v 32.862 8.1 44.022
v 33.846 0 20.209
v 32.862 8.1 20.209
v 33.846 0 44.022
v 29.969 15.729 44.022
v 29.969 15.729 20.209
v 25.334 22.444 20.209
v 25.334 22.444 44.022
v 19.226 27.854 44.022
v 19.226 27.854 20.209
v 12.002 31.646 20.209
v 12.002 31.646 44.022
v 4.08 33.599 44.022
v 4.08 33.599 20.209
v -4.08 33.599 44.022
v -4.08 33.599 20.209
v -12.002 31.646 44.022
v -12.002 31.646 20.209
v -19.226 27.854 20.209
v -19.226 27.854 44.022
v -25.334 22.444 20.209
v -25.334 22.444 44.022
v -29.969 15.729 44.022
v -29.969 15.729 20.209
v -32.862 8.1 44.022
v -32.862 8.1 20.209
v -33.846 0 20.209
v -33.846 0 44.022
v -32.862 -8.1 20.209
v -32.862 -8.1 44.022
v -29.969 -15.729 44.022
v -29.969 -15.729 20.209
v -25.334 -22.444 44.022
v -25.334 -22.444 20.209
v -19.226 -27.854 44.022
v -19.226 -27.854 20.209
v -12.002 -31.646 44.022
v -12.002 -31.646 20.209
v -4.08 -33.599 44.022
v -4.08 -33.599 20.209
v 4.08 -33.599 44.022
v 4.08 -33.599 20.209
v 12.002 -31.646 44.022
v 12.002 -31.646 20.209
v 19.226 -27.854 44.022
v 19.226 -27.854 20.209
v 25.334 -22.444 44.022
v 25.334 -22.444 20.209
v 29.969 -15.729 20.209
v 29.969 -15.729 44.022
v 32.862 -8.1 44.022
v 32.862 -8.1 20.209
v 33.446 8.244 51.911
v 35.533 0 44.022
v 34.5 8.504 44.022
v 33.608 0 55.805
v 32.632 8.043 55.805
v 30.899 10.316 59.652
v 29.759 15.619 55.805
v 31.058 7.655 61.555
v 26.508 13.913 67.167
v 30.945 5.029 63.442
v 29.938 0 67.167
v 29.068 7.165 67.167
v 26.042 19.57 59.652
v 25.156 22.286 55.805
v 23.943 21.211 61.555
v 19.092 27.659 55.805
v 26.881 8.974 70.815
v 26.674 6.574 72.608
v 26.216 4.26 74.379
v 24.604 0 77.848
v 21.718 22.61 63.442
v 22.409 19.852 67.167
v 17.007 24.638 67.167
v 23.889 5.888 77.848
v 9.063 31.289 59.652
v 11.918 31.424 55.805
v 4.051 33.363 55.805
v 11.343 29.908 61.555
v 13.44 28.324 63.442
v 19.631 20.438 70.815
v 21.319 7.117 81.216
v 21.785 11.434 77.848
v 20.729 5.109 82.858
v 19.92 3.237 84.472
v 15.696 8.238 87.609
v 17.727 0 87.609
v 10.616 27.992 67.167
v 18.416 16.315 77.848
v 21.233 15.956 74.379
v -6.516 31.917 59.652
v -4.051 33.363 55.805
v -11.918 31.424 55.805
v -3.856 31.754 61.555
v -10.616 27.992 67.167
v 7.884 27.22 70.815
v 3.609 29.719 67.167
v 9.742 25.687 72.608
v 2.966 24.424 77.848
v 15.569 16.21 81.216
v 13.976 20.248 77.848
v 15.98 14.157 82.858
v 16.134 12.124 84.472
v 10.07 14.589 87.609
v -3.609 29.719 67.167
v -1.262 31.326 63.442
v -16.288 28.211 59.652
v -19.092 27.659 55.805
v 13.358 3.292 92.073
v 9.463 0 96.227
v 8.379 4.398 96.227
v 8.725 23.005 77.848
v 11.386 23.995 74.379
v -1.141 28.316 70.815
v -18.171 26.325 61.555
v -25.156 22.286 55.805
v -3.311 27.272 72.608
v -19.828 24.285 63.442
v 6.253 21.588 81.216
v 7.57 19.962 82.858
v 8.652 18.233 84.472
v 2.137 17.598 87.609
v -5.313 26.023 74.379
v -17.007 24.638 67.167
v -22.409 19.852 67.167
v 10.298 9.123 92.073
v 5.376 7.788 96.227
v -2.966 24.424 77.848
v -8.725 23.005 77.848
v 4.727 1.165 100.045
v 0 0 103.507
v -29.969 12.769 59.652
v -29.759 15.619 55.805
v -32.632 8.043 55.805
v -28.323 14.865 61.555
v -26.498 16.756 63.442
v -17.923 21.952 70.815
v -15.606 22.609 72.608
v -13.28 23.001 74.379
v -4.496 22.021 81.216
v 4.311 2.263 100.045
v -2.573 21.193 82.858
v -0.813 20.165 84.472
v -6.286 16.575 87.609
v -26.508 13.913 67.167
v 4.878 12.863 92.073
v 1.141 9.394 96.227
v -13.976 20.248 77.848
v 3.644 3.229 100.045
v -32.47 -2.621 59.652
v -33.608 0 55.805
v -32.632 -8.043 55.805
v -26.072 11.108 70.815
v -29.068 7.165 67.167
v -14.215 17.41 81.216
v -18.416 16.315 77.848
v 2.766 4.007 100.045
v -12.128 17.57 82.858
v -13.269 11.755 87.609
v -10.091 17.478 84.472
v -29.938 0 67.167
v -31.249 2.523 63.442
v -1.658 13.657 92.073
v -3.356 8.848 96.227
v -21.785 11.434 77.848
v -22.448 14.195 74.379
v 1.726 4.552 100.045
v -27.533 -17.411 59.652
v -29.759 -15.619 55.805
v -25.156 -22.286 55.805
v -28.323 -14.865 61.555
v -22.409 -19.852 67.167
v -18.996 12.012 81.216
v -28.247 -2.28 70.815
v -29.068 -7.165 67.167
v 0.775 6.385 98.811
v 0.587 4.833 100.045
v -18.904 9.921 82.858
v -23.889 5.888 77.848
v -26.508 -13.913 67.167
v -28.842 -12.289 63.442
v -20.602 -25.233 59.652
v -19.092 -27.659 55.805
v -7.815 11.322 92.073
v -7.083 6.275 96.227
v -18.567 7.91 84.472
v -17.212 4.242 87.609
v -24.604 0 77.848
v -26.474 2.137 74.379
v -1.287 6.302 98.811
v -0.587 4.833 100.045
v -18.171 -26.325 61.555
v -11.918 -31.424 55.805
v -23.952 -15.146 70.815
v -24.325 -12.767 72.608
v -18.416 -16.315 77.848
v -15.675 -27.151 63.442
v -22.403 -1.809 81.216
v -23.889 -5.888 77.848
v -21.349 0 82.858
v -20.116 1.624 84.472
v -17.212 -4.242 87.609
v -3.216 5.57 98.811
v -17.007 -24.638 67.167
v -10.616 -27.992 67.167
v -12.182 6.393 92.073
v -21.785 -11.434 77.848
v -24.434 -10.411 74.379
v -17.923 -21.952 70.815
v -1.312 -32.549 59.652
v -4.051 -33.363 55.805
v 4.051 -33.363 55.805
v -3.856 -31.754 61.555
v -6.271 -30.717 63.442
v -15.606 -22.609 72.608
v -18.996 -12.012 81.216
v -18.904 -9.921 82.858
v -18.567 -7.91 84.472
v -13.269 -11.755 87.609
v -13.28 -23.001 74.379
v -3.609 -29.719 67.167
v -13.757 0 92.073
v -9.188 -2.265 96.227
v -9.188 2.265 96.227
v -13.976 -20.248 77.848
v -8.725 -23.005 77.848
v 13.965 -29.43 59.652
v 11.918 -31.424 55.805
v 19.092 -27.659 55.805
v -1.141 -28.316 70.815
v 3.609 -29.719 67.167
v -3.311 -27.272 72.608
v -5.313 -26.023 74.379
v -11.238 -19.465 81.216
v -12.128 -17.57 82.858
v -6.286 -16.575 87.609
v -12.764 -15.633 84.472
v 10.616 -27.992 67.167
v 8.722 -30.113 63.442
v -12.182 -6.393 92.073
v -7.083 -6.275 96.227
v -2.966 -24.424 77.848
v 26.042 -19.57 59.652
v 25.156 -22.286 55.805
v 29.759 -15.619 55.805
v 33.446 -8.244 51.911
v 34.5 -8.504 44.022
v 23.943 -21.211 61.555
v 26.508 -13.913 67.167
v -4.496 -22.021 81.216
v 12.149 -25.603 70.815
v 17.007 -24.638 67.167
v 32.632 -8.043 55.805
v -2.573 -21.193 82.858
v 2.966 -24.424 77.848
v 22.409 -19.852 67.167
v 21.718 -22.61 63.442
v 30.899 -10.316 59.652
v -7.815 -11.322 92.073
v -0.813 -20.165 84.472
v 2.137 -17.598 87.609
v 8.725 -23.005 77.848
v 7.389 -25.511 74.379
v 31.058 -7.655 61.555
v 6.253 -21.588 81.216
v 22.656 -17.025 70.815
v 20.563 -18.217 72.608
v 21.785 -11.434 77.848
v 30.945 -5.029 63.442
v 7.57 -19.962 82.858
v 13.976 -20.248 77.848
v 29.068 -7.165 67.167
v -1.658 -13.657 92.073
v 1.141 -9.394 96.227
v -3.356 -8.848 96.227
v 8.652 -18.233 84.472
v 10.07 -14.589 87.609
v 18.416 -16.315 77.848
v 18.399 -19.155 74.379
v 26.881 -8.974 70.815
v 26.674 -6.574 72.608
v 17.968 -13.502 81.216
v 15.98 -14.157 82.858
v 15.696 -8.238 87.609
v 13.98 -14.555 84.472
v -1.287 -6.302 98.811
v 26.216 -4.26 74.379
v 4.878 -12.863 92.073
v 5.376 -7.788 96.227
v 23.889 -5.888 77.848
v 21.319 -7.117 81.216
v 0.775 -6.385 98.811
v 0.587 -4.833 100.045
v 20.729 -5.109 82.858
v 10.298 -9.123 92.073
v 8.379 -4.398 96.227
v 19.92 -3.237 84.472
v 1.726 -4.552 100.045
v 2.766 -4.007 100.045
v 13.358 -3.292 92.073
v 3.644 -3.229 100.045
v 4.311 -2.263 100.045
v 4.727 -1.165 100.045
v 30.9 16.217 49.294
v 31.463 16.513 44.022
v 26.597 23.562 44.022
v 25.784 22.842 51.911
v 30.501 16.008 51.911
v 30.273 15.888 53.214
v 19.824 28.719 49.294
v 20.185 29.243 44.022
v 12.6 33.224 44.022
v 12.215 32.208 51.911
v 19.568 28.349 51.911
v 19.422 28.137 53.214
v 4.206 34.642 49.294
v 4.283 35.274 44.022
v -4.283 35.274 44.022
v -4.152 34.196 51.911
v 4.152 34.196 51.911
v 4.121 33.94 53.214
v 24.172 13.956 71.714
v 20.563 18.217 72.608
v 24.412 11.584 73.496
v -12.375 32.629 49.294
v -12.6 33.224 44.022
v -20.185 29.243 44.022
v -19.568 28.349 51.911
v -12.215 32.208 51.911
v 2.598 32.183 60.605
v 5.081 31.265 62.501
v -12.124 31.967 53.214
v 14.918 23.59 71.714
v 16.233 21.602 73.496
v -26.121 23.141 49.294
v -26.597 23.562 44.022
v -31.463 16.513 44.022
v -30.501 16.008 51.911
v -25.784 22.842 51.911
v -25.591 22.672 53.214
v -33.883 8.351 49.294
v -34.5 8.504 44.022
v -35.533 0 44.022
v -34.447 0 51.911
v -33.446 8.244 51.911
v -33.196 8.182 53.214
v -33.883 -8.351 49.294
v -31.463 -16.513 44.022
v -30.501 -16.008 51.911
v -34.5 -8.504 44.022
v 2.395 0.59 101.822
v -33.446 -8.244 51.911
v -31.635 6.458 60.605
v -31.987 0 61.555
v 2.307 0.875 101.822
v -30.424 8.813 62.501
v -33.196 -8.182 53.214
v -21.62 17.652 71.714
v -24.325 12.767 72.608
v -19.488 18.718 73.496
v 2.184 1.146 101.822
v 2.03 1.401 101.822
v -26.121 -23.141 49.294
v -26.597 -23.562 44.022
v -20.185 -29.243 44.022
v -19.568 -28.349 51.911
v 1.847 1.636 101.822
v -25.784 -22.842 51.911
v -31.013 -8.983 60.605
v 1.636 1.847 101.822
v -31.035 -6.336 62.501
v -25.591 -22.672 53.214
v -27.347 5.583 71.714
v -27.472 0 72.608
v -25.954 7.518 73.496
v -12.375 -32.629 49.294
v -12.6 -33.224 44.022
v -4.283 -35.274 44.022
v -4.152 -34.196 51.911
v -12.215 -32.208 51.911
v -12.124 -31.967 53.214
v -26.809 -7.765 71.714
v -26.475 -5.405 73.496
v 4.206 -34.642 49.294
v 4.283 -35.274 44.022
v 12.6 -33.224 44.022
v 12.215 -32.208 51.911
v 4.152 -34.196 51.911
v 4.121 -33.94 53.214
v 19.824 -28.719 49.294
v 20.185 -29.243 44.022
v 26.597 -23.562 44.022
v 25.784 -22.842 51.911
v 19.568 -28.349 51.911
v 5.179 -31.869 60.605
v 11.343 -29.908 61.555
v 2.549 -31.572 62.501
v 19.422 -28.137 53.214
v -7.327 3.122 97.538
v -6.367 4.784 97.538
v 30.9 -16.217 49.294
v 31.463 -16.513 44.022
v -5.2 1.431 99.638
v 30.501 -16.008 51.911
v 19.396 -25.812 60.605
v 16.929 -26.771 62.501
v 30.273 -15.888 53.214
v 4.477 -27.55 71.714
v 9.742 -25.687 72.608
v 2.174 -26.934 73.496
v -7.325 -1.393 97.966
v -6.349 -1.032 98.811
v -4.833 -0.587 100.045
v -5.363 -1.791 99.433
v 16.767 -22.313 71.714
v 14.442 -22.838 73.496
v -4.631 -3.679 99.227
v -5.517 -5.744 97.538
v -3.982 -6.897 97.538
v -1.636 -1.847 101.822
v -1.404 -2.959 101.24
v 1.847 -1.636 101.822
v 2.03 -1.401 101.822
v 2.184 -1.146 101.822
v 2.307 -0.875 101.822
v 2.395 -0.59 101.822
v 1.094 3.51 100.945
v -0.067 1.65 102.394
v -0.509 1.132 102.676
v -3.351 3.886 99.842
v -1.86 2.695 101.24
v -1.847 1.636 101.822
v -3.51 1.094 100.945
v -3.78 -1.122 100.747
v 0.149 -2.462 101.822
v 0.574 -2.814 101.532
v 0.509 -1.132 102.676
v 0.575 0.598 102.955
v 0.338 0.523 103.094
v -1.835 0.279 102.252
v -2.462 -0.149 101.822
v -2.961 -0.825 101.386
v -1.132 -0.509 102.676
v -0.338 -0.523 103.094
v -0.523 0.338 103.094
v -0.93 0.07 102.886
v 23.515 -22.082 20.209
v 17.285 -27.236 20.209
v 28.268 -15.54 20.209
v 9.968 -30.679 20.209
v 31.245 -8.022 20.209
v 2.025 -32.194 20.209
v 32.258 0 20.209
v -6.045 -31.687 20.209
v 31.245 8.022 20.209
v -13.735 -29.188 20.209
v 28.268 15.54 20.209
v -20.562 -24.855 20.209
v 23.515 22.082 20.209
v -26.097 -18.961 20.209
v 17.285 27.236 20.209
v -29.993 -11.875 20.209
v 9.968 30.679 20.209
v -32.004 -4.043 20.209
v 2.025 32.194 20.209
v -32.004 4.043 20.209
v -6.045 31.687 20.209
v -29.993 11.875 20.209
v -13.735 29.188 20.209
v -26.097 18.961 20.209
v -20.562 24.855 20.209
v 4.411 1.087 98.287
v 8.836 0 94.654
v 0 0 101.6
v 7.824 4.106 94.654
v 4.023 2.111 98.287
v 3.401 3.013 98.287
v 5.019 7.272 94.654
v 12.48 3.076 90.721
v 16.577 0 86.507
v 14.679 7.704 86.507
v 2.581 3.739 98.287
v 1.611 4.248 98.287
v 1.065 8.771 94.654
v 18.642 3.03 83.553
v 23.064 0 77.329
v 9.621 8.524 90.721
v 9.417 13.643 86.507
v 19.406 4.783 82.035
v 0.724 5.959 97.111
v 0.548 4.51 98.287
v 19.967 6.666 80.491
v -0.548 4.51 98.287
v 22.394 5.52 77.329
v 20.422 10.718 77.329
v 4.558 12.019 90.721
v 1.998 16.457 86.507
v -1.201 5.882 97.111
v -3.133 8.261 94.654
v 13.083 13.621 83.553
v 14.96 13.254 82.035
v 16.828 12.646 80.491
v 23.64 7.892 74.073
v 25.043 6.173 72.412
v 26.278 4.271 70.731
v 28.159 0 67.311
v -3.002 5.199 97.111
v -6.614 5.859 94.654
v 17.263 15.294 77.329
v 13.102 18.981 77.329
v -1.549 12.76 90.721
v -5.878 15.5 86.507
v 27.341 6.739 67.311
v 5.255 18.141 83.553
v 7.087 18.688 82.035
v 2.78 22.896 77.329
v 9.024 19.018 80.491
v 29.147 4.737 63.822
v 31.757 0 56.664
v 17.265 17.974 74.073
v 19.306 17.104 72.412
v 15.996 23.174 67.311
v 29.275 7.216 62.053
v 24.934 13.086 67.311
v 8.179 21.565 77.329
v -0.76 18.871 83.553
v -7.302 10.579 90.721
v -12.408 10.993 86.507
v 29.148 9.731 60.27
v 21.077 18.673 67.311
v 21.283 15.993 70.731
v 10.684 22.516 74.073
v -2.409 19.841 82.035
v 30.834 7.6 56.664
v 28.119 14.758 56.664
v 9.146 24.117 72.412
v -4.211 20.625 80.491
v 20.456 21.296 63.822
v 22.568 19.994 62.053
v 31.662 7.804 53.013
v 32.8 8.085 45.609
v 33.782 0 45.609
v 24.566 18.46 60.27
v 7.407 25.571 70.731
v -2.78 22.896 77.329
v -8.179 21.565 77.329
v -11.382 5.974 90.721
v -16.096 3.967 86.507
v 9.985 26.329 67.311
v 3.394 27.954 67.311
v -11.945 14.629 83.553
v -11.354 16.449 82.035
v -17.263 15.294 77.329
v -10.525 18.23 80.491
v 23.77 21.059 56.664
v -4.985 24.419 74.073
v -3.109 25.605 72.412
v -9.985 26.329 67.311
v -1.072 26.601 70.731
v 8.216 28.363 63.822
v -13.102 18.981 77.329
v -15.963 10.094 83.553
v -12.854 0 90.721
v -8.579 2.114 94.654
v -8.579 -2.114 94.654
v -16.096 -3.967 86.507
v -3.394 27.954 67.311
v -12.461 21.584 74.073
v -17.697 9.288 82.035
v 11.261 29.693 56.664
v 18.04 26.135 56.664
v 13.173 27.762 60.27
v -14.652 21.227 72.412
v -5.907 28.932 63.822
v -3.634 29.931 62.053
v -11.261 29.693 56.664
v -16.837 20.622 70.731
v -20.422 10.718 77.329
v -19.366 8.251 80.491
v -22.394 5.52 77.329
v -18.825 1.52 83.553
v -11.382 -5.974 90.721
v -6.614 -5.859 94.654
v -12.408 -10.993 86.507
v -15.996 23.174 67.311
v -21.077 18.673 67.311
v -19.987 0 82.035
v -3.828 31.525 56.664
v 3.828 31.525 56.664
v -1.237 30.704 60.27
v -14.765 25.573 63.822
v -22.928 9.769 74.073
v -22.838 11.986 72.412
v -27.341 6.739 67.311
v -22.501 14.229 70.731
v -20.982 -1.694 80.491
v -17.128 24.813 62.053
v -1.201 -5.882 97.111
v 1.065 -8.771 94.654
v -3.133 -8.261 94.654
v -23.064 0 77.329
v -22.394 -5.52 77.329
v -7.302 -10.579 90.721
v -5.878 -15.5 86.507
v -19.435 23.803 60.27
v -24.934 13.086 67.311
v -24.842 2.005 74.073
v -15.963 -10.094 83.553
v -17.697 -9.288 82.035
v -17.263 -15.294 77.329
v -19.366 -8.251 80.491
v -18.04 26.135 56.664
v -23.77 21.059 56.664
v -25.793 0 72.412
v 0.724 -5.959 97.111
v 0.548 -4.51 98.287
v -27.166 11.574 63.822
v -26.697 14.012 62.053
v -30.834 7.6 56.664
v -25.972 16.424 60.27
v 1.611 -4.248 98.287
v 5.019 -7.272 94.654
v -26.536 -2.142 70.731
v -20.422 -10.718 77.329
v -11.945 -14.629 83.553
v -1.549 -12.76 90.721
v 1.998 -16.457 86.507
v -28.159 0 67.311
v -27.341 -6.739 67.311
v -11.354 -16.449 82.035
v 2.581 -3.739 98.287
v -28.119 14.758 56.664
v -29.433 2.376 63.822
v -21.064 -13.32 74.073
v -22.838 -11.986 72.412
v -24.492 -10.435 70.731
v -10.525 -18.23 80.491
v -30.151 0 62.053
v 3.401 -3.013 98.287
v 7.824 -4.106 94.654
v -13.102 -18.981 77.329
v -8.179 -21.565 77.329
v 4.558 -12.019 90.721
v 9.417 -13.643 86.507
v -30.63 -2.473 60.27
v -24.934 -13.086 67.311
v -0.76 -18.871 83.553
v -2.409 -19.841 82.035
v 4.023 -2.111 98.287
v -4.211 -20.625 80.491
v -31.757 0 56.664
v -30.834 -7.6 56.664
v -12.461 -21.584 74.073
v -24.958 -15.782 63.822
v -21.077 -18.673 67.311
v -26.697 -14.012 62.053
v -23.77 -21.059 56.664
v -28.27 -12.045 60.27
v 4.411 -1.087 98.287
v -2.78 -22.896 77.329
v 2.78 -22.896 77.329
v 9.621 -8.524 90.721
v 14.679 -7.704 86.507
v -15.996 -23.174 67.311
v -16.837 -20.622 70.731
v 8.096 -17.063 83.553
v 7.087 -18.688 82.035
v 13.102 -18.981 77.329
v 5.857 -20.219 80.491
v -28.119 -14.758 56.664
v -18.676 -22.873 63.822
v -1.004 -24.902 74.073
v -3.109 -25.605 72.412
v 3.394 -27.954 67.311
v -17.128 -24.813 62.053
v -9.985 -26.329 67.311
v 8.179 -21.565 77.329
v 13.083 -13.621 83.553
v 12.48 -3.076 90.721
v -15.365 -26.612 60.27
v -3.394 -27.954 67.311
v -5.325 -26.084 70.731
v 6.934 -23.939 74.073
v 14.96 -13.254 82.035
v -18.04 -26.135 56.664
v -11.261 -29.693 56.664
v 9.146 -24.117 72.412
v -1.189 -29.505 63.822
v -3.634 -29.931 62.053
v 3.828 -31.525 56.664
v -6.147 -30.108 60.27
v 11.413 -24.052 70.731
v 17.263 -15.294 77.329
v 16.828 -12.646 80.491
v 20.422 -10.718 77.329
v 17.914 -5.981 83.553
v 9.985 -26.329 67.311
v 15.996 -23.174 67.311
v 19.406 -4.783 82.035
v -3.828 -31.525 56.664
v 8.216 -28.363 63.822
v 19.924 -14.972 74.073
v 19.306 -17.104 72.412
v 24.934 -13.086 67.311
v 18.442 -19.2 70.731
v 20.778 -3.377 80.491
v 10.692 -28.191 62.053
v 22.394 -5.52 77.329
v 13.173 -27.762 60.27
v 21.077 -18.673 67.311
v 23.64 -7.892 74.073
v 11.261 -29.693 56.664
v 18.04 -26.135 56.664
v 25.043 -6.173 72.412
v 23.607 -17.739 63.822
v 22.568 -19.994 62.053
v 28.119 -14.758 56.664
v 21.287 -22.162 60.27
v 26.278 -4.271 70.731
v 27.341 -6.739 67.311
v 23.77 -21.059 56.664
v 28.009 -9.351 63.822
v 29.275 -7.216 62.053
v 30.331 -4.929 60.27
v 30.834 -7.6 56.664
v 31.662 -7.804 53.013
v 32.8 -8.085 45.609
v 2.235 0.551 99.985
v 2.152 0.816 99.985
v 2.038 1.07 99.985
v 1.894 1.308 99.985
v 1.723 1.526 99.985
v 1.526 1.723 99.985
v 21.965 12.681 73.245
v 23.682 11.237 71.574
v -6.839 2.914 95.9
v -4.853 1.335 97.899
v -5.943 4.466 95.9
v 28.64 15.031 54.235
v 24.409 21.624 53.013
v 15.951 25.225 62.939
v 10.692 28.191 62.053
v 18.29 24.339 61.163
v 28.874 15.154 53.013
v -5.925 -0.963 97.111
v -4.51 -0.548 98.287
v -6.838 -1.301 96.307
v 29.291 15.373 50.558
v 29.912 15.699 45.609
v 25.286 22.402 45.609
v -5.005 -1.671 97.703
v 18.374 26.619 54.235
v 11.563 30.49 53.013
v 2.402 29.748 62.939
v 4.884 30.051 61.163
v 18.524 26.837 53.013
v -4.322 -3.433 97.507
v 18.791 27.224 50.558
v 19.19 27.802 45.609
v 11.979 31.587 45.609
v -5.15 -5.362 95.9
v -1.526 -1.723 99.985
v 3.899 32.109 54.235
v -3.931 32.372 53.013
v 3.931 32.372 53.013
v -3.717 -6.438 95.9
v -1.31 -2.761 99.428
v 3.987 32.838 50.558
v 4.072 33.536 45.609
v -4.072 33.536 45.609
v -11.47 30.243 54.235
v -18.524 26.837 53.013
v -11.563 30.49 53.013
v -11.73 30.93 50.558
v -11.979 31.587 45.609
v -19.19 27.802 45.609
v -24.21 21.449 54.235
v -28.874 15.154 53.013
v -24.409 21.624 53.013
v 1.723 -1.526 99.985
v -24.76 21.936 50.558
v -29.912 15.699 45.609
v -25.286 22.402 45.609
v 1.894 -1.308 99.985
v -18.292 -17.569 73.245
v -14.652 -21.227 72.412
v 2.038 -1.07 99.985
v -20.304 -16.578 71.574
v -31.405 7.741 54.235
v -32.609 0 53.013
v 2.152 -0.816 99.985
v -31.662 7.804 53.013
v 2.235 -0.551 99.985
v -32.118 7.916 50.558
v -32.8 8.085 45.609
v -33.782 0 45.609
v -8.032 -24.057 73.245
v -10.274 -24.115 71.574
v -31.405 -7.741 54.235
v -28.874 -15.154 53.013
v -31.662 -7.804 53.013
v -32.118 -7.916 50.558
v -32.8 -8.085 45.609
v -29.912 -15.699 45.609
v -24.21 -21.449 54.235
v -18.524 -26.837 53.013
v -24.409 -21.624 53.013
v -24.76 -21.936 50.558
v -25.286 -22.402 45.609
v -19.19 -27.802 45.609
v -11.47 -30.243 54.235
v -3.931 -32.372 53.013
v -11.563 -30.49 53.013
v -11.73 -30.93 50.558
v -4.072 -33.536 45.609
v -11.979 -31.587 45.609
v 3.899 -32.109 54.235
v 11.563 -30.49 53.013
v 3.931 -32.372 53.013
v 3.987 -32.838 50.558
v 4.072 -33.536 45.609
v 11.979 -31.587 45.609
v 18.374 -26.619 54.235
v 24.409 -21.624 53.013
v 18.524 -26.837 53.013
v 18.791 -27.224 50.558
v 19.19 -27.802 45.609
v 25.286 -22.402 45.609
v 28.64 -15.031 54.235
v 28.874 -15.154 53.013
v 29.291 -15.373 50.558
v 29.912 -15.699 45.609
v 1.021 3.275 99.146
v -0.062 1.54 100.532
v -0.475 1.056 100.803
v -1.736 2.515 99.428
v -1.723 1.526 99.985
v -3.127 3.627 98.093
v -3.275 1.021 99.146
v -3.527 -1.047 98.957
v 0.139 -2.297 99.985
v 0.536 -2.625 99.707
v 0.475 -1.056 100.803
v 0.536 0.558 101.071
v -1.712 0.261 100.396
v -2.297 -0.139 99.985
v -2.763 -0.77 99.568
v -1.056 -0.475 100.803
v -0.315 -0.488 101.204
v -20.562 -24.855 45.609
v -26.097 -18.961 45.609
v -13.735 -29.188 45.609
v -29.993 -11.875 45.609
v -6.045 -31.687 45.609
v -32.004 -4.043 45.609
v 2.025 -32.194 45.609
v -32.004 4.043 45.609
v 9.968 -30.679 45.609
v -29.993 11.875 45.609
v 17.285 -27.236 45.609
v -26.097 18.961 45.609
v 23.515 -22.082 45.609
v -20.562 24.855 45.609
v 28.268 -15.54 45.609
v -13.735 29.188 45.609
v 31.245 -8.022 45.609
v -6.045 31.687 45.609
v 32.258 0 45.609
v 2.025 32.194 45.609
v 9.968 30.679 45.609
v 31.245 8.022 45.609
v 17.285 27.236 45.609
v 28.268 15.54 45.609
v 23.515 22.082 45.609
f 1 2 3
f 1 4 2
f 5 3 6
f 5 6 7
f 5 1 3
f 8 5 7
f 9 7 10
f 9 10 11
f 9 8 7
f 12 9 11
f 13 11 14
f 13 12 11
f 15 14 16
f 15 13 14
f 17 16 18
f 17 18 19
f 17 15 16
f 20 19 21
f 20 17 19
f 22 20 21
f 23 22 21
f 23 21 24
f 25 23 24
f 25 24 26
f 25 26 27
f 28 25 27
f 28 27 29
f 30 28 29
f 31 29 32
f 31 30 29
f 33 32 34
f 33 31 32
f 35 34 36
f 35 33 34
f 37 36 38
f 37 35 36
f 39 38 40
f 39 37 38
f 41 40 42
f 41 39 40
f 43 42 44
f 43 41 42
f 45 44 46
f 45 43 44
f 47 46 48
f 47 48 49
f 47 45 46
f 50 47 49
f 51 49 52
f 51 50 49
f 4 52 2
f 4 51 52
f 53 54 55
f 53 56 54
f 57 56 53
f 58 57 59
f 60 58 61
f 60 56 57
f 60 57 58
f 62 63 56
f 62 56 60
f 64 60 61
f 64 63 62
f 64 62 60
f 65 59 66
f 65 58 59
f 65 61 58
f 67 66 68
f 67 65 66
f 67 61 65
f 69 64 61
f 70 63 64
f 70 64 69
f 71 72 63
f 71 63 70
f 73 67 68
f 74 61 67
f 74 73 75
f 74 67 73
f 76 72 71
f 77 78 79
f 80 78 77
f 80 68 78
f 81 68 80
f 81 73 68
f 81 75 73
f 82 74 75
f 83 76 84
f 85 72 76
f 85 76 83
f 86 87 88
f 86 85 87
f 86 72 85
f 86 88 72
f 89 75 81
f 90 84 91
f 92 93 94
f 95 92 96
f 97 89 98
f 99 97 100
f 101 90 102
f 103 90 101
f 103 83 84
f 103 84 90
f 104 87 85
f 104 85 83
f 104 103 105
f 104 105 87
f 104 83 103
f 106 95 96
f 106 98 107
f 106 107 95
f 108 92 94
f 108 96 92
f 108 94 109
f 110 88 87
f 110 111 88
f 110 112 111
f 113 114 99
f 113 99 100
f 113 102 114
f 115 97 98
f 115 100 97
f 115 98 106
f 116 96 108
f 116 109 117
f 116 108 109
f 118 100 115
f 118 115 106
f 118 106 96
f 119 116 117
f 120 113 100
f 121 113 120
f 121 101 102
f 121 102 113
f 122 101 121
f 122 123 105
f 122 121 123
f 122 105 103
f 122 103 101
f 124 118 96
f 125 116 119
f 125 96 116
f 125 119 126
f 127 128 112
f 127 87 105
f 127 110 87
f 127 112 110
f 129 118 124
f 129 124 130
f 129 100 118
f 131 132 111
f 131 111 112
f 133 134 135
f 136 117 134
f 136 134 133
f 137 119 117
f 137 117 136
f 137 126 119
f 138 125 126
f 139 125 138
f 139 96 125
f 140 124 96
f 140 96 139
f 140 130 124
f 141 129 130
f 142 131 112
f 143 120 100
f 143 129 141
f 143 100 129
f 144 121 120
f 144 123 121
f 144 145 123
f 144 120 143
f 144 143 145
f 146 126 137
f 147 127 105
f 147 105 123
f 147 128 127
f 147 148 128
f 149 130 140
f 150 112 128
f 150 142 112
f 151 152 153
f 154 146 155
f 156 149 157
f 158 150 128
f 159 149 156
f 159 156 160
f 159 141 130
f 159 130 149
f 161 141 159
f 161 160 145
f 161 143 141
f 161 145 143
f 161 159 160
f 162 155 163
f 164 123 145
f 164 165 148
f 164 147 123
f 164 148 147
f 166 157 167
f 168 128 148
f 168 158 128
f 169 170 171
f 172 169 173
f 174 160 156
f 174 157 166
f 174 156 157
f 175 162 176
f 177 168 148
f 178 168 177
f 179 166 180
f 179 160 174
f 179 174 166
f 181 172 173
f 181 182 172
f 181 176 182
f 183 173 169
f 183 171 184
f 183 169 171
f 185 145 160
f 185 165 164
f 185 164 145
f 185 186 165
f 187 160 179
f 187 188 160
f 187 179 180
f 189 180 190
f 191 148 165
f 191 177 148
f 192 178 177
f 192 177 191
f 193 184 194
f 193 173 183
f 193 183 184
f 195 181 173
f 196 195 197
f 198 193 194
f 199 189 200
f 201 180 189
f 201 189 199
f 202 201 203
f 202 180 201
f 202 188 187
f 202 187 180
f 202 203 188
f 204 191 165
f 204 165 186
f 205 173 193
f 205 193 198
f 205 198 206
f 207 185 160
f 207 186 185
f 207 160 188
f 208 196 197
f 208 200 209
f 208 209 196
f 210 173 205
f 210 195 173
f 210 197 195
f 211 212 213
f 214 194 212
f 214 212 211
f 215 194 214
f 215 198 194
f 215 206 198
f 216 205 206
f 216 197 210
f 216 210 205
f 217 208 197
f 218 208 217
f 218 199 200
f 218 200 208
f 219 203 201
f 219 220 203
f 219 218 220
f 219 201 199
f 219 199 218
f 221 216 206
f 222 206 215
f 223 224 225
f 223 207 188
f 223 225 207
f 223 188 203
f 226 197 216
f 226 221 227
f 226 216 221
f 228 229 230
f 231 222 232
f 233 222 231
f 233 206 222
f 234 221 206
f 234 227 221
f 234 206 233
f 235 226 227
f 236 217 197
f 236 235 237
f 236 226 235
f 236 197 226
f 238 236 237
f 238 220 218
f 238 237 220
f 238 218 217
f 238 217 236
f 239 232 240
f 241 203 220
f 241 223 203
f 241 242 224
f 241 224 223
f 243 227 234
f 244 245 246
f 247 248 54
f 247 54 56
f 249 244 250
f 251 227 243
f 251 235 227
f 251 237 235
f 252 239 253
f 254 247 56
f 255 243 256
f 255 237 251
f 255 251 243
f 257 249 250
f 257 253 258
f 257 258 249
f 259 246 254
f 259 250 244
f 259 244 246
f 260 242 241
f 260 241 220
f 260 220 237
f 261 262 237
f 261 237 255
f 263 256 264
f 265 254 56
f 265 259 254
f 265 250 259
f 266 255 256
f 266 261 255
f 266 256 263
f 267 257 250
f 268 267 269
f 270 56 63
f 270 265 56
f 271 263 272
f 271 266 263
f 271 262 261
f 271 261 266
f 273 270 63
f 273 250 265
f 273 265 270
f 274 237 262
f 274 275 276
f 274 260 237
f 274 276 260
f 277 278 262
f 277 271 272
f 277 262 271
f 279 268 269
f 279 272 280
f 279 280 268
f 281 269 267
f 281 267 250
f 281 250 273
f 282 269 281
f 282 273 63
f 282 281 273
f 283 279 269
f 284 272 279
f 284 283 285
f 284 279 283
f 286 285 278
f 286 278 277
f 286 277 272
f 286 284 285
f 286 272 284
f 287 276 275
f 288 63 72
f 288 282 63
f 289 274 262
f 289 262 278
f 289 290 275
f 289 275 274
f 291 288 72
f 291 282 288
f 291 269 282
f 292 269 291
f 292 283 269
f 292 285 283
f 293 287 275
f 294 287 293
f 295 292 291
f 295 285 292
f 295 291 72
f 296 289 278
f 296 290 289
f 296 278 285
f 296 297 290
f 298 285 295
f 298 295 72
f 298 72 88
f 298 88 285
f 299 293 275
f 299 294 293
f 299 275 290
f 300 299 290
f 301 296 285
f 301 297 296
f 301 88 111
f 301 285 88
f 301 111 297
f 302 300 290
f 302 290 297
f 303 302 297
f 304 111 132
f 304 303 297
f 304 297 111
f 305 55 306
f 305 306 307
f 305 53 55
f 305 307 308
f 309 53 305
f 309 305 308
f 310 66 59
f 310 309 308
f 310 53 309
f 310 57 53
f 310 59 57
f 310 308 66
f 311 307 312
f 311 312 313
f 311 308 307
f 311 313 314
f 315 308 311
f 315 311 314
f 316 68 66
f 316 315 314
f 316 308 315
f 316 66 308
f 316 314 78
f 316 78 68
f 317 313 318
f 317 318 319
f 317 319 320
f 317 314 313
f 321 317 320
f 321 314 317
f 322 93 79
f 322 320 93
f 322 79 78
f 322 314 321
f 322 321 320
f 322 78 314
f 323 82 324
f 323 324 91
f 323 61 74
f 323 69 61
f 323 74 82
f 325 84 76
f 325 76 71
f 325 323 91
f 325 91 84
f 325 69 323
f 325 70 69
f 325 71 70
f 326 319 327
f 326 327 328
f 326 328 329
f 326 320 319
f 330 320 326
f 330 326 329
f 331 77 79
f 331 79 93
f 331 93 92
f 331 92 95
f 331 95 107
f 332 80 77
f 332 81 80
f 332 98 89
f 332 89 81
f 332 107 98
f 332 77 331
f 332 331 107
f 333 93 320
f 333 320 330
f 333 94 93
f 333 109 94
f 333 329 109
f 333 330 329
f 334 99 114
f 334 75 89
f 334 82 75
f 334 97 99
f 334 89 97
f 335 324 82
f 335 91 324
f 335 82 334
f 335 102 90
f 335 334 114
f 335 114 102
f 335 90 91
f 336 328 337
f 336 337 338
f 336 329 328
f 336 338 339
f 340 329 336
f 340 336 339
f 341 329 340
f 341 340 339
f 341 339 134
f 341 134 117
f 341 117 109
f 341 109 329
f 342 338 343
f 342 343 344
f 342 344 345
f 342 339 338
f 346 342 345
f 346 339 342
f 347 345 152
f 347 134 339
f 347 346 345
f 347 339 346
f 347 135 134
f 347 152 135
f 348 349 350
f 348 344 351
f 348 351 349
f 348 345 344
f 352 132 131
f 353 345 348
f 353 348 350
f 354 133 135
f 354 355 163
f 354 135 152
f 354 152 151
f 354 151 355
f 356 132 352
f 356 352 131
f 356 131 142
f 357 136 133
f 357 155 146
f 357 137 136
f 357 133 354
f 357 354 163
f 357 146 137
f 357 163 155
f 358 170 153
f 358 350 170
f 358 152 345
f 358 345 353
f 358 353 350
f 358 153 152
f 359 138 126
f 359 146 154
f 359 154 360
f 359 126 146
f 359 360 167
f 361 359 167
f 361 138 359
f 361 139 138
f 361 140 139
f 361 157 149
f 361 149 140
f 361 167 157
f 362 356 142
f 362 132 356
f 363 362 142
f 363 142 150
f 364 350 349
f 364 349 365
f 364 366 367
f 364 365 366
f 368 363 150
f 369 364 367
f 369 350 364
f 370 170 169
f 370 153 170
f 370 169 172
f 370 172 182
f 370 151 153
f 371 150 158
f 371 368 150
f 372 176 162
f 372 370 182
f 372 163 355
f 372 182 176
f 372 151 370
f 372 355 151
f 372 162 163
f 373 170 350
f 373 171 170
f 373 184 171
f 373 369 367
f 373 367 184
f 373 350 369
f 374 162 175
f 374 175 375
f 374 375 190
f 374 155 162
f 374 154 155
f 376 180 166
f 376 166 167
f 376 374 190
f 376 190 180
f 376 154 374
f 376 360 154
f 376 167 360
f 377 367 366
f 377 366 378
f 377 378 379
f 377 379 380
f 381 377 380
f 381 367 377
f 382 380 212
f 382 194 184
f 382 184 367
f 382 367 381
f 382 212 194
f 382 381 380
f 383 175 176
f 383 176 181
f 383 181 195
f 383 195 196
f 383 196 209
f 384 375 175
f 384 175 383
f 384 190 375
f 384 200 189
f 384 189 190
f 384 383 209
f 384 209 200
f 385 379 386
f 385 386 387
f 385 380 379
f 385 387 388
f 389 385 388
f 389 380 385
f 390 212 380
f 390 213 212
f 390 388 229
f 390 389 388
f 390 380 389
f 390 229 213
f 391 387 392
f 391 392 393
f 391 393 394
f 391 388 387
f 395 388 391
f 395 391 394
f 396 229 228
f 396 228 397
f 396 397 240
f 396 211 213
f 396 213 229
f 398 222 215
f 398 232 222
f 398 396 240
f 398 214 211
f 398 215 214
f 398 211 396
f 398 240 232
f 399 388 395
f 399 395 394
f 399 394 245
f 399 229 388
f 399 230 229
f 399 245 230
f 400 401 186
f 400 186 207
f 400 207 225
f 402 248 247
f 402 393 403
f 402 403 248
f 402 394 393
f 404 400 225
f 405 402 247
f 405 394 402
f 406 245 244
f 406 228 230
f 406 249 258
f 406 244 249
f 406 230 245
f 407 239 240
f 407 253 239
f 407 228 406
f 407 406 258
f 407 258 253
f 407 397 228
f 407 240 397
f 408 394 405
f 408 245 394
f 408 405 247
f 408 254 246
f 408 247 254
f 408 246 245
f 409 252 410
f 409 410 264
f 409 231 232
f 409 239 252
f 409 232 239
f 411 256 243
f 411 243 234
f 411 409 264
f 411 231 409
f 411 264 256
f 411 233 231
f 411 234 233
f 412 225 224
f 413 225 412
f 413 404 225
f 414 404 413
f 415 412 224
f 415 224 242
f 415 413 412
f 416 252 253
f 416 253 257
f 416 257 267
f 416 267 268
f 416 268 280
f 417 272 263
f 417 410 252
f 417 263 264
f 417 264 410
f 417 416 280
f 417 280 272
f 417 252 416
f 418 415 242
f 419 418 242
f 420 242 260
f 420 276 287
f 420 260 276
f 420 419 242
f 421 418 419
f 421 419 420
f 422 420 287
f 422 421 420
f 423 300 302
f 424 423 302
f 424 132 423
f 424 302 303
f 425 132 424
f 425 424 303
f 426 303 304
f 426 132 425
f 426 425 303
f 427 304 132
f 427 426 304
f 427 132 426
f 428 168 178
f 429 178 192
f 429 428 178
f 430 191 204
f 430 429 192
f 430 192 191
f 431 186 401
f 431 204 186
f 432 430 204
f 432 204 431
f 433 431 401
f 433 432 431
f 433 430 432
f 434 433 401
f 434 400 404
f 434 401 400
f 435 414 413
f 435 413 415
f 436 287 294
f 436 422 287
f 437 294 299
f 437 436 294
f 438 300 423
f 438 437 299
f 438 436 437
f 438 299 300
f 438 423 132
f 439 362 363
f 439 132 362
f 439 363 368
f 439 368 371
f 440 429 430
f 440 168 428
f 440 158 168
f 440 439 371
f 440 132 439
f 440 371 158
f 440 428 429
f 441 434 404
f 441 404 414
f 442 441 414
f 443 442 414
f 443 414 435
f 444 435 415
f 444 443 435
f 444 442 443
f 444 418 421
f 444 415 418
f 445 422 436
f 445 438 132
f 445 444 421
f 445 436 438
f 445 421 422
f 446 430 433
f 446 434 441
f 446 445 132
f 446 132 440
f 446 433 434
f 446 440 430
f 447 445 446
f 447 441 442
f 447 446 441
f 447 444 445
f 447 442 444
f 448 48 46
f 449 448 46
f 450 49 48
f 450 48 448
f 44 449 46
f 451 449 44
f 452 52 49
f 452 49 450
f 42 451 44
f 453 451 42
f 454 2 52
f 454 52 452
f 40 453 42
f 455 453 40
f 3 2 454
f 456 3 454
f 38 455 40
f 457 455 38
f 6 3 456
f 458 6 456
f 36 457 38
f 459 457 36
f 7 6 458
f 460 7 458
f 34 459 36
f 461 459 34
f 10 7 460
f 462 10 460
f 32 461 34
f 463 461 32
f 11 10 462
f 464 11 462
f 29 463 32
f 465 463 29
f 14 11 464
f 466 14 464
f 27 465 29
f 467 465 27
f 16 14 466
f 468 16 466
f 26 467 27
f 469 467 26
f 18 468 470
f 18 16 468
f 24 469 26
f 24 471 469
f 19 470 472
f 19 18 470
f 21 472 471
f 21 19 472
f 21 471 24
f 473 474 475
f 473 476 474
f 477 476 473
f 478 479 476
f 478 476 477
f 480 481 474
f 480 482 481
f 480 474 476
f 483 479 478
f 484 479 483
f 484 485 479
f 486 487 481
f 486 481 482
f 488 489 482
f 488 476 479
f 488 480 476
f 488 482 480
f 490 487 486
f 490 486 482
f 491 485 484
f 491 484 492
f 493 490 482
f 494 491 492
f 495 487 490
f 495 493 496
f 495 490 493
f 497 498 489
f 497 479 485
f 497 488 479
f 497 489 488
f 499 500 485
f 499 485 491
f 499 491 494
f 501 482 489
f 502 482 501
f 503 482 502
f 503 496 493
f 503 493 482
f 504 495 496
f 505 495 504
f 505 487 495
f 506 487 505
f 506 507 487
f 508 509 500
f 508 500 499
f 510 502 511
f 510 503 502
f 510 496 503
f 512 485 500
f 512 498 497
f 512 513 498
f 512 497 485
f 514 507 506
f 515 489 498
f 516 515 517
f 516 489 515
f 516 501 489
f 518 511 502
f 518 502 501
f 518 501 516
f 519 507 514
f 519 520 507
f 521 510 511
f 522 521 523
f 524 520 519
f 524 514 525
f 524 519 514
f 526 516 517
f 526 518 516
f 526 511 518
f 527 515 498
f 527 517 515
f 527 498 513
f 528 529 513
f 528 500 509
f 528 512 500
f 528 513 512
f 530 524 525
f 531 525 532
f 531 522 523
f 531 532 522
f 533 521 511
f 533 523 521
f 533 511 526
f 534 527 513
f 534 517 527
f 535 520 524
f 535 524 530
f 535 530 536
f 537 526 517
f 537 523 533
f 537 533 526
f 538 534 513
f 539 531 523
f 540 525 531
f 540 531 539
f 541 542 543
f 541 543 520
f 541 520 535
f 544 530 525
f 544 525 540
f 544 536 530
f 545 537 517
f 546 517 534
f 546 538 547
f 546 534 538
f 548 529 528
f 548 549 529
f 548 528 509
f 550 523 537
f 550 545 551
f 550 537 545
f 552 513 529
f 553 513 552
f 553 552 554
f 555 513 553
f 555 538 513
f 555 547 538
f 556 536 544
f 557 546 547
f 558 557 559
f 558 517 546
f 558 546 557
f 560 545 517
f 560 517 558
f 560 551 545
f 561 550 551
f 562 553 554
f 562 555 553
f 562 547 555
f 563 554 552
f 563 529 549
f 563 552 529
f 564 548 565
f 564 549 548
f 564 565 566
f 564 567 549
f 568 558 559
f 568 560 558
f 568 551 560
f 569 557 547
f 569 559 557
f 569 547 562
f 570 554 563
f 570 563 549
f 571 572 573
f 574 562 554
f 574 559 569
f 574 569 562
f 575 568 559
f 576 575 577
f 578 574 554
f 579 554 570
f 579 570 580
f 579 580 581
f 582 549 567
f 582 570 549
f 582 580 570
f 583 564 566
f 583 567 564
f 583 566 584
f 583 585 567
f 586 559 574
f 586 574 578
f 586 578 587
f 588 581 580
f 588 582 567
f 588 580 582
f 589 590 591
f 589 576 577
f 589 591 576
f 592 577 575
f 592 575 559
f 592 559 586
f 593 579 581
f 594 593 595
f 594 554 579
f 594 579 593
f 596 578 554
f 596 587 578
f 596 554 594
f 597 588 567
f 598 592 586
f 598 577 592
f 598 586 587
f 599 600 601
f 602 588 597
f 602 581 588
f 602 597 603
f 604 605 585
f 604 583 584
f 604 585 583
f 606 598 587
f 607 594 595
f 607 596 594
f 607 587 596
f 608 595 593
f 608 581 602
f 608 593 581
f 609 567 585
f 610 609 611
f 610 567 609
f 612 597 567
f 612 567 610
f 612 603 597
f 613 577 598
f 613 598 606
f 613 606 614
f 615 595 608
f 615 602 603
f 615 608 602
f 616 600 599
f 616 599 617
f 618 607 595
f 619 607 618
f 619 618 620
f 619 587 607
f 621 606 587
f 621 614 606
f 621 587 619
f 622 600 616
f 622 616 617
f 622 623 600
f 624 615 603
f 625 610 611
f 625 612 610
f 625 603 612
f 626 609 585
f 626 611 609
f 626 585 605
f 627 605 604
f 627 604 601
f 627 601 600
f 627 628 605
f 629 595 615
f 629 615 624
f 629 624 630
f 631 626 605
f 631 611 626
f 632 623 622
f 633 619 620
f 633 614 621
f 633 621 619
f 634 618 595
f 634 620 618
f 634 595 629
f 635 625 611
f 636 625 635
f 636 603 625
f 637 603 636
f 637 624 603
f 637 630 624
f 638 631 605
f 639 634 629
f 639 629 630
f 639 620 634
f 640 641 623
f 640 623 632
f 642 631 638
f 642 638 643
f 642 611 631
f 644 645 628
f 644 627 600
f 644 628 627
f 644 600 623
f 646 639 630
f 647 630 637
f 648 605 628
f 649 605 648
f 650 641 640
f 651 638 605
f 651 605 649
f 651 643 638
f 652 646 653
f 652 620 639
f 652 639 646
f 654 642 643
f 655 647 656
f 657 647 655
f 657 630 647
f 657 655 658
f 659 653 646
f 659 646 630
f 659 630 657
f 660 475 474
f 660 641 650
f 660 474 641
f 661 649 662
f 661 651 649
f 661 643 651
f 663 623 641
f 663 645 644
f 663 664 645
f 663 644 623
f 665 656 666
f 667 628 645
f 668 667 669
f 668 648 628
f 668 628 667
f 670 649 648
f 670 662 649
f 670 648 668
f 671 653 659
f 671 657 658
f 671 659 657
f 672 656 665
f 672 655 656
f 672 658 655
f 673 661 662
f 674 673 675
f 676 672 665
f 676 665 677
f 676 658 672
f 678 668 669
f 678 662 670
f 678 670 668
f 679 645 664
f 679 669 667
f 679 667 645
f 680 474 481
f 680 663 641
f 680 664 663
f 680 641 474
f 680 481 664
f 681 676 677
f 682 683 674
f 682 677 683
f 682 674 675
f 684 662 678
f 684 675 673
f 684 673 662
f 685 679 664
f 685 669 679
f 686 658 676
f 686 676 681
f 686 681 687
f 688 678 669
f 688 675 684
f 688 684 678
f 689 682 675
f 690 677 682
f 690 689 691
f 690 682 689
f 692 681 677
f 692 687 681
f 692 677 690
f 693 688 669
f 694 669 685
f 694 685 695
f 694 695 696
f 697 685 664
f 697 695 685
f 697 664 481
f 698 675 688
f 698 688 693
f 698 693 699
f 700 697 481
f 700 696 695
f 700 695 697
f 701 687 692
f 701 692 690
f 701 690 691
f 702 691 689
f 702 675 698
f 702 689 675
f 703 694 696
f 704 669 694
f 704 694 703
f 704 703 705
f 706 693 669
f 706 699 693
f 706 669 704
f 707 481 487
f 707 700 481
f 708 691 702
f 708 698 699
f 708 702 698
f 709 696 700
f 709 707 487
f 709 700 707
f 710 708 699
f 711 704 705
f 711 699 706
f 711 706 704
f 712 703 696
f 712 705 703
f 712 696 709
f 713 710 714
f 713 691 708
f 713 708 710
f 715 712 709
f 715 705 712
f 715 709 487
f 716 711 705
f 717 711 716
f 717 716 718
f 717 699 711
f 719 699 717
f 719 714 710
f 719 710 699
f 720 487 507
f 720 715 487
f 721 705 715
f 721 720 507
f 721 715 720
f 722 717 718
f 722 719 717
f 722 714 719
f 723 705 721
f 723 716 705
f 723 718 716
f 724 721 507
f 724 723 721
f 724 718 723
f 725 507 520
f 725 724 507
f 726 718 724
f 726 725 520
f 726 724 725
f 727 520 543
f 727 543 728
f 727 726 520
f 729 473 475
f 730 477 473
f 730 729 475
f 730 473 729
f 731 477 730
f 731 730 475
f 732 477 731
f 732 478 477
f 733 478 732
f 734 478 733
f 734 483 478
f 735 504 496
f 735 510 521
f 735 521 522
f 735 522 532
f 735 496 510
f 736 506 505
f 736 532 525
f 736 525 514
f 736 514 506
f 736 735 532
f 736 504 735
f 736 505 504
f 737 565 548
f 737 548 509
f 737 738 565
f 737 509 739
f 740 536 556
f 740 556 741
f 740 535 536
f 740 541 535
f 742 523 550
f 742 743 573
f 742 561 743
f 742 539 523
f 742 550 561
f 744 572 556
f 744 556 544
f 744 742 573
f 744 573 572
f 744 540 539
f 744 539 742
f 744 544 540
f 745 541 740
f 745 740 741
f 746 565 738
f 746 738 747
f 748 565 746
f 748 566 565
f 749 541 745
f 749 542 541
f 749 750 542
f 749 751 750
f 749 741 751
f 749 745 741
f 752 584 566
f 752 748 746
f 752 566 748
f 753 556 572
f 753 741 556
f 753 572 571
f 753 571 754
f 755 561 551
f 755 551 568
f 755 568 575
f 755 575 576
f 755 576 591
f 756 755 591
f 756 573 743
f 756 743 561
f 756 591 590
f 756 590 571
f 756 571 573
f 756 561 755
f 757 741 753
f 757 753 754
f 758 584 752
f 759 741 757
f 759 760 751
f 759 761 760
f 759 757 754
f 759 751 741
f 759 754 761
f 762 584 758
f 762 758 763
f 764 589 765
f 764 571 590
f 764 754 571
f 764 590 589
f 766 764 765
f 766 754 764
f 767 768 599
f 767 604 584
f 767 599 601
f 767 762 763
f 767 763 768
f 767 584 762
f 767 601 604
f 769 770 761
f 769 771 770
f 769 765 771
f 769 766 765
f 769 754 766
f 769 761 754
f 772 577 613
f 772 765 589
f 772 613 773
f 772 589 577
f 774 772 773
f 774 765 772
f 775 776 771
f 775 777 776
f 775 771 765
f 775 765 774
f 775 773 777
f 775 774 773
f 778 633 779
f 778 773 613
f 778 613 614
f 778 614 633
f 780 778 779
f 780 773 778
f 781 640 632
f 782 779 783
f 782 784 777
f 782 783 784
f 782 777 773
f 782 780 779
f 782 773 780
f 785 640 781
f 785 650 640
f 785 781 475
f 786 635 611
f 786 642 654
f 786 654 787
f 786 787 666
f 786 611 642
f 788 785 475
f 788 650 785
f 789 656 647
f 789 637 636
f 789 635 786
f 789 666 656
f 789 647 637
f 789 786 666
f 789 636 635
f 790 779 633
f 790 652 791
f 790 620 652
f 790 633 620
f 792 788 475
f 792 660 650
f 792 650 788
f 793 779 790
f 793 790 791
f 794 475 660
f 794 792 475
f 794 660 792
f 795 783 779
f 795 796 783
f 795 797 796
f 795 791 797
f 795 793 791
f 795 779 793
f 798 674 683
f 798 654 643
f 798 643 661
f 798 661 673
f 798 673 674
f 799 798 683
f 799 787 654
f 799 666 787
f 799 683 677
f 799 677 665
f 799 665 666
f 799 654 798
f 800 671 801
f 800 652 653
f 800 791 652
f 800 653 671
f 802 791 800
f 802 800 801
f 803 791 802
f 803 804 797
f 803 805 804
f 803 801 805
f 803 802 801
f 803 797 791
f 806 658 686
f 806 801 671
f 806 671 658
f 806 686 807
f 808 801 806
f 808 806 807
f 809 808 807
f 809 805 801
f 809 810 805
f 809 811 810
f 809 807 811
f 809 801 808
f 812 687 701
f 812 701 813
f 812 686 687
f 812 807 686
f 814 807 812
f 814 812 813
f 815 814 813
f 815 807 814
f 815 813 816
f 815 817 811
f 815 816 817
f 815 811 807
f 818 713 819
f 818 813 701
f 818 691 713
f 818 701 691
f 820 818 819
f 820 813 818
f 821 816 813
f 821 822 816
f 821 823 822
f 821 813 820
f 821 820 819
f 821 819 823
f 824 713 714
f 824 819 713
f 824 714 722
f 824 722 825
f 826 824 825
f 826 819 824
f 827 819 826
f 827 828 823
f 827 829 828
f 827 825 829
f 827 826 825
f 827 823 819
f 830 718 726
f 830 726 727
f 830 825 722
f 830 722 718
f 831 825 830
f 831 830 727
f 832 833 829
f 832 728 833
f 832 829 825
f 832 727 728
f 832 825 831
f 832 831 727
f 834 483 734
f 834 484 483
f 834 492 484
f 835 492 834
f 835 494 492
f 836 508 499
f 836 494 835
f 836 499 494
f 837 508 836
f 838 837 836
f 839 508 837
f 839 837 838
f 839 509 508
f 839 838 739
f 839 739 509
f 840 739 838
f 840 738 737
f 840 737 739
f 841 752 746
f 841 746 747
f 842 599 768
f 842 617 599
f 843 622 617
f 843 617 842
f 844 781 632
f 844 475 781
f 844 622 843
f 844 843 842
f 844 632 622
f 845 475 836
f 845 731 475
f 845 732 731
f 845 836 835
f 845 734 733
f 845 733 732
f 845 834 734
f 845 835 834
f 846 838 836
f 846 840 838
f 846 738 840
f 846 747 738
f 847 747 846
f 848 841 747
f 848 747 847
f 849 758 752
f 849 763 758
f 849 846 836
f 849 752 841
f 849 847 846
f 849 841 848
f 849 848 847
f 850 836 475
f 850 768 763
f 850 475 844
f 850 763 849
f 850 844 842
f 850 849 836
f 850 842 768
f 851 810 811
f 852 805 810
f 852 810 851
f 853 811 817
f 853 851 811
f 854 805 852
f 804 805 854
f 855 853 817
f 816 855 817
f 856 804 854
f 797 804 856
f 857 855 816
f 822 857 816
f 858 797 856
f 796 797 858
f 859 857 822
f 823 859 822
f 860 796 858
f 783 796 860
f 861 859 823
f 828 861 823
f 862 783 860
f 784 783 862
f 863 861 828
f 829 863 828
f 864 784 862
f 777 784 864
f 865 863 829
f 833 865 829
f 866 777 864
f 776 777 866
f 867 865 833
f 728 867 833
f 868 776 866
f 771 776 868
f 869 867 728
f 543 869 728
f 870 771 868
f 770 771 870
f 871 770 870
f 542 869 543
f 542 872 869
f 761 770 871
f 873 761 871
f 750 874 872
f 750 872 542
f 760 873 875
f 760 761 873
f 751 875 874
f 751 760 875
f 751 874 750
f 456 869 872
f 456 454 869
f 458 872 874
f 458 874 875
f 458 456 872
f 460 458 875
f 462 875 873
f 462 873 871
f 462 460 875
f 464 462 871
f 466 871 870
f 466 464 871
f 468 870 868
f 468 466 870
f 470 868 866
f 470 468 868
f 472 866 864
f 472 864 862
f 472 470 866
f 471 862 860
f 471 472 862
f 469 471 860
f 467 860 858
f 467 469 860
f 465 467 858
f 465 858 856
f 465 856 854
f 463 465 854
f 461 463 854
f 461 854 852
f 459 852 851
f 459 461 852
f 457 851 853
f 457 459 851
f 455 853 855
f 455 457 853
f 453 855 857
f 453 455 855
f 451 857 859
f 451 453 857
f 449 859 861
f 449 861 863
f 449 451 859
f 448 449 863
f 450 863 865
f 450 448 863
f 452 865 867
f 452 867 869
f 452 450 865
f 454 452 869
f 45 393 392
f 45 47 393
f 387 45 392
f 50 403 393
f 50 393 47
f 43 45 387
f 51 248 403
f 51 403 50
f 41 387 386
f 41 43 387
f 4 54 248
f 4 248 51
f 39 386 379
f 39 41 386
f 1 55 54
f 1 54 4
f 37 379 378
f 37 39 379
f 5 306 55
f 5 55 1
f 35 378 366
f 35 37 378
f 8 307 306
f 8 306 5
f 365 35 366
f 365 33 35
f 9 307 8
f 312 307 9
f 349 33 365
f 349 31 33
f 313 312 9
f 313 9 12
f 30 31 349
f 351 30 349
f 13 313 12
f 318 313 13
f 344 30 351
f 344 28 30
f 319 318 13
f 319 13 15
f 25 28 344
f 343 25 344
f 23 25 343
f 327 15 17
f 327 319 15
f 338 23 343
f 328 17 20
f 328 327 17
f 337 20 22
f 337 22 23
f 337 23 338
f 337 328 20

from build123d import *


with BuildPart() as f1:
    # F0 (on Front) → F1 (revolve)
    with BuildSketch(Plane.XZ):
        with BuildLine():
            Line((32.258, 29.458879), (32.258, 20.209176))
            Line((32.258, 20.209176), (33.8455, 20.209176))
            Line((33.8455, 20.209176), (33.8455, 44.021676))
            Line((33.8455, 44.021676), (35.53259, 44.021676))
            ThreePointArc((35.53259, 44.021676), (24.603532, 77.848371), (0, 103.506816))
            Line((0, 103.506816), (0, 101.6))
            ThreePointArc((0, 101.6), (23.063776, 77.328925), (33.782, 45.609176))
            Line((33.782, 45.609176), (32.258, 45.609176))
            Line((32.258, 45.609176), (32.258, 29.458879))
        make_face()
    revolve(axis=Axis((0, 0, 50.8), (0, 0, 1)))


solid = f1.part
